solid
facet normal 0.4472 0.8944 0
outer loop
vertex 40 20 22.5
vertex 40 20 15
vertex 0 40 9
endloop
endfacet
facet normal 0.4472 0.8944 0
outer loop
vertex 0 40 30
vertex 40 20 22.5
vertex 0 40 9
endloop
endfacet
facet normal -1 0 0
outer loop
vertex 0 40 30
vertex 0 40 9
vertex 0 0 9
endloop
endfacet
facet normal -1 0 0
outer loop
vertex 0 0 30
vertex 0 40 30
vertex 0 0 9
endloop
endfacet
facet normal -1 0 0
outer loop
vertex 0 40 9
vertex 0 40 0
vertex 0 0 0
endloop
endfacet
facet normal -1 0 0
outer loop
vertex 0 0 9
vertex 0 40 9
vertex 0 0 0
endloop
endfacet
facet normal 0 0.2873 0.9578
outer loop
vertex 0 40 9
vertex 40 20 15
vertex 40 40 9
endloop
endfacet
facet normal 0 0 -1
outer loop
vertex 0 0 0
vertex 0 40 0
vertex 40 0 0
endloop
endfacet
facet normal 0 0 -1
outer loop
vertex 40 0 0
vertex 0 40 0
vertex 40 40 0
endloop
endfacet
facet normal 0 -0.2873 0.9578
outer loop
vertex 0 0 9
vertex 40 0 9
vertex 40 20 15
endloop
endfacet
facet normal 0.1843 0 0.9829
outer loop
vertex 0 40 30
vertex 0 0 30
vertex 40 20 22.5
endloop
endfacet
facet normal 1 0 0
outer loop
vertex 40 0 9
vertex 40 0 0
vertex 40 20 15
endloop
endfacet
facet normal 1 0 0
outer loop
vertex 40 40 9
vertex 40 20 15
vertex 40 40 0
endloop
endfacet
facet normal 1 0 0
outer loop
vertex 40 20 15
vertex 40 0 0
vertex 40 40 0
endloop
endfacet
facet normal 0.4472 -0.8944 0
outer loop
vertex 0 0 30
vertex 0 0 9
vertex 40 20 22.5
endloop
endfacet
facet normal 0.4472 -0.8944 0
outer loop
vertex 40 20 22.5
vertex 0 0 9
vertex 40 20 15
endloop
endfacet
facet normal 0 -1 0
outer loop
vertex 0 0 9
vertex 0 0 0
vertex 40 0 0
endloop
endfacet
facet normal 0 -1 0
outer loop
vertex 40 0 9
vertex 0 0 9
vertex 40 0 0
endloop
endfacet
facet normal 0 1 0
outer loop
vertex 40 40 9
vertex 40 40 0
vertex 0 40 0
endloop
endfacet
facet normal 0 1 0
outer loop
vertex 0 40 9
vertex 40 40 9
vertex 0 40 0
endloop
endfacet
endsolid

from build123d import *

# Parameters (mm, degrees)
F1_DEPTH = 15
F3_DEPTH = 40.001
F4_DEPTH = 30
F8_DEPTH = 7.372541402


with BuildPart() as f1:
    # F0 (on Top) → F1 (new body)
    with BuildSketch(Plane.XY):
        Polygon((40, 20), (0, 0), (40, 0), align=None)
        Polygon((0, 40), (0, 0), (40, 20), align=None)
        Polygon((40, 40), (0, 40), (40, 20), align=None)
    extrude(amount=F1_DEPTH)

    # F2 (on face) → F3 (cut, through all)
    with BuildSketch(Plane.YZ.offset(40)):
        Polygon((0, 9), (20, 15), (0, 15), align=None)
        Polygon((40, 15), (20, 15), (40, 9), align=None)
    extrude(amount=-F3_DEPTH, mode=Mode.SUBTRACT)

    # F0 (on Top) → F4 (join)
    with BuildSketch(Plane.XY):
        Polygon((0, 40), (0, 0), (40, 20), align=None)
    extrude(amount=F4_DEPTH)

    # F7 (on 3pt) → F8 (cut, through all)
    with BuildSketch(Plane(origin=(5.4339622642, 0, 28.9811320755), x_dir=(0.9828721869, 0, -0.1842885351), z_dir=(-0.1842885351, 0, -0.9828721869))):
        Polygon((35.1683954387, -20), (-5.5286560515, 0), (-5.5286560515, -40), align=None)
    extrude(amount=-F8_DEPTH, mode=Mode.SUBTRACT)


solid = f1.part
